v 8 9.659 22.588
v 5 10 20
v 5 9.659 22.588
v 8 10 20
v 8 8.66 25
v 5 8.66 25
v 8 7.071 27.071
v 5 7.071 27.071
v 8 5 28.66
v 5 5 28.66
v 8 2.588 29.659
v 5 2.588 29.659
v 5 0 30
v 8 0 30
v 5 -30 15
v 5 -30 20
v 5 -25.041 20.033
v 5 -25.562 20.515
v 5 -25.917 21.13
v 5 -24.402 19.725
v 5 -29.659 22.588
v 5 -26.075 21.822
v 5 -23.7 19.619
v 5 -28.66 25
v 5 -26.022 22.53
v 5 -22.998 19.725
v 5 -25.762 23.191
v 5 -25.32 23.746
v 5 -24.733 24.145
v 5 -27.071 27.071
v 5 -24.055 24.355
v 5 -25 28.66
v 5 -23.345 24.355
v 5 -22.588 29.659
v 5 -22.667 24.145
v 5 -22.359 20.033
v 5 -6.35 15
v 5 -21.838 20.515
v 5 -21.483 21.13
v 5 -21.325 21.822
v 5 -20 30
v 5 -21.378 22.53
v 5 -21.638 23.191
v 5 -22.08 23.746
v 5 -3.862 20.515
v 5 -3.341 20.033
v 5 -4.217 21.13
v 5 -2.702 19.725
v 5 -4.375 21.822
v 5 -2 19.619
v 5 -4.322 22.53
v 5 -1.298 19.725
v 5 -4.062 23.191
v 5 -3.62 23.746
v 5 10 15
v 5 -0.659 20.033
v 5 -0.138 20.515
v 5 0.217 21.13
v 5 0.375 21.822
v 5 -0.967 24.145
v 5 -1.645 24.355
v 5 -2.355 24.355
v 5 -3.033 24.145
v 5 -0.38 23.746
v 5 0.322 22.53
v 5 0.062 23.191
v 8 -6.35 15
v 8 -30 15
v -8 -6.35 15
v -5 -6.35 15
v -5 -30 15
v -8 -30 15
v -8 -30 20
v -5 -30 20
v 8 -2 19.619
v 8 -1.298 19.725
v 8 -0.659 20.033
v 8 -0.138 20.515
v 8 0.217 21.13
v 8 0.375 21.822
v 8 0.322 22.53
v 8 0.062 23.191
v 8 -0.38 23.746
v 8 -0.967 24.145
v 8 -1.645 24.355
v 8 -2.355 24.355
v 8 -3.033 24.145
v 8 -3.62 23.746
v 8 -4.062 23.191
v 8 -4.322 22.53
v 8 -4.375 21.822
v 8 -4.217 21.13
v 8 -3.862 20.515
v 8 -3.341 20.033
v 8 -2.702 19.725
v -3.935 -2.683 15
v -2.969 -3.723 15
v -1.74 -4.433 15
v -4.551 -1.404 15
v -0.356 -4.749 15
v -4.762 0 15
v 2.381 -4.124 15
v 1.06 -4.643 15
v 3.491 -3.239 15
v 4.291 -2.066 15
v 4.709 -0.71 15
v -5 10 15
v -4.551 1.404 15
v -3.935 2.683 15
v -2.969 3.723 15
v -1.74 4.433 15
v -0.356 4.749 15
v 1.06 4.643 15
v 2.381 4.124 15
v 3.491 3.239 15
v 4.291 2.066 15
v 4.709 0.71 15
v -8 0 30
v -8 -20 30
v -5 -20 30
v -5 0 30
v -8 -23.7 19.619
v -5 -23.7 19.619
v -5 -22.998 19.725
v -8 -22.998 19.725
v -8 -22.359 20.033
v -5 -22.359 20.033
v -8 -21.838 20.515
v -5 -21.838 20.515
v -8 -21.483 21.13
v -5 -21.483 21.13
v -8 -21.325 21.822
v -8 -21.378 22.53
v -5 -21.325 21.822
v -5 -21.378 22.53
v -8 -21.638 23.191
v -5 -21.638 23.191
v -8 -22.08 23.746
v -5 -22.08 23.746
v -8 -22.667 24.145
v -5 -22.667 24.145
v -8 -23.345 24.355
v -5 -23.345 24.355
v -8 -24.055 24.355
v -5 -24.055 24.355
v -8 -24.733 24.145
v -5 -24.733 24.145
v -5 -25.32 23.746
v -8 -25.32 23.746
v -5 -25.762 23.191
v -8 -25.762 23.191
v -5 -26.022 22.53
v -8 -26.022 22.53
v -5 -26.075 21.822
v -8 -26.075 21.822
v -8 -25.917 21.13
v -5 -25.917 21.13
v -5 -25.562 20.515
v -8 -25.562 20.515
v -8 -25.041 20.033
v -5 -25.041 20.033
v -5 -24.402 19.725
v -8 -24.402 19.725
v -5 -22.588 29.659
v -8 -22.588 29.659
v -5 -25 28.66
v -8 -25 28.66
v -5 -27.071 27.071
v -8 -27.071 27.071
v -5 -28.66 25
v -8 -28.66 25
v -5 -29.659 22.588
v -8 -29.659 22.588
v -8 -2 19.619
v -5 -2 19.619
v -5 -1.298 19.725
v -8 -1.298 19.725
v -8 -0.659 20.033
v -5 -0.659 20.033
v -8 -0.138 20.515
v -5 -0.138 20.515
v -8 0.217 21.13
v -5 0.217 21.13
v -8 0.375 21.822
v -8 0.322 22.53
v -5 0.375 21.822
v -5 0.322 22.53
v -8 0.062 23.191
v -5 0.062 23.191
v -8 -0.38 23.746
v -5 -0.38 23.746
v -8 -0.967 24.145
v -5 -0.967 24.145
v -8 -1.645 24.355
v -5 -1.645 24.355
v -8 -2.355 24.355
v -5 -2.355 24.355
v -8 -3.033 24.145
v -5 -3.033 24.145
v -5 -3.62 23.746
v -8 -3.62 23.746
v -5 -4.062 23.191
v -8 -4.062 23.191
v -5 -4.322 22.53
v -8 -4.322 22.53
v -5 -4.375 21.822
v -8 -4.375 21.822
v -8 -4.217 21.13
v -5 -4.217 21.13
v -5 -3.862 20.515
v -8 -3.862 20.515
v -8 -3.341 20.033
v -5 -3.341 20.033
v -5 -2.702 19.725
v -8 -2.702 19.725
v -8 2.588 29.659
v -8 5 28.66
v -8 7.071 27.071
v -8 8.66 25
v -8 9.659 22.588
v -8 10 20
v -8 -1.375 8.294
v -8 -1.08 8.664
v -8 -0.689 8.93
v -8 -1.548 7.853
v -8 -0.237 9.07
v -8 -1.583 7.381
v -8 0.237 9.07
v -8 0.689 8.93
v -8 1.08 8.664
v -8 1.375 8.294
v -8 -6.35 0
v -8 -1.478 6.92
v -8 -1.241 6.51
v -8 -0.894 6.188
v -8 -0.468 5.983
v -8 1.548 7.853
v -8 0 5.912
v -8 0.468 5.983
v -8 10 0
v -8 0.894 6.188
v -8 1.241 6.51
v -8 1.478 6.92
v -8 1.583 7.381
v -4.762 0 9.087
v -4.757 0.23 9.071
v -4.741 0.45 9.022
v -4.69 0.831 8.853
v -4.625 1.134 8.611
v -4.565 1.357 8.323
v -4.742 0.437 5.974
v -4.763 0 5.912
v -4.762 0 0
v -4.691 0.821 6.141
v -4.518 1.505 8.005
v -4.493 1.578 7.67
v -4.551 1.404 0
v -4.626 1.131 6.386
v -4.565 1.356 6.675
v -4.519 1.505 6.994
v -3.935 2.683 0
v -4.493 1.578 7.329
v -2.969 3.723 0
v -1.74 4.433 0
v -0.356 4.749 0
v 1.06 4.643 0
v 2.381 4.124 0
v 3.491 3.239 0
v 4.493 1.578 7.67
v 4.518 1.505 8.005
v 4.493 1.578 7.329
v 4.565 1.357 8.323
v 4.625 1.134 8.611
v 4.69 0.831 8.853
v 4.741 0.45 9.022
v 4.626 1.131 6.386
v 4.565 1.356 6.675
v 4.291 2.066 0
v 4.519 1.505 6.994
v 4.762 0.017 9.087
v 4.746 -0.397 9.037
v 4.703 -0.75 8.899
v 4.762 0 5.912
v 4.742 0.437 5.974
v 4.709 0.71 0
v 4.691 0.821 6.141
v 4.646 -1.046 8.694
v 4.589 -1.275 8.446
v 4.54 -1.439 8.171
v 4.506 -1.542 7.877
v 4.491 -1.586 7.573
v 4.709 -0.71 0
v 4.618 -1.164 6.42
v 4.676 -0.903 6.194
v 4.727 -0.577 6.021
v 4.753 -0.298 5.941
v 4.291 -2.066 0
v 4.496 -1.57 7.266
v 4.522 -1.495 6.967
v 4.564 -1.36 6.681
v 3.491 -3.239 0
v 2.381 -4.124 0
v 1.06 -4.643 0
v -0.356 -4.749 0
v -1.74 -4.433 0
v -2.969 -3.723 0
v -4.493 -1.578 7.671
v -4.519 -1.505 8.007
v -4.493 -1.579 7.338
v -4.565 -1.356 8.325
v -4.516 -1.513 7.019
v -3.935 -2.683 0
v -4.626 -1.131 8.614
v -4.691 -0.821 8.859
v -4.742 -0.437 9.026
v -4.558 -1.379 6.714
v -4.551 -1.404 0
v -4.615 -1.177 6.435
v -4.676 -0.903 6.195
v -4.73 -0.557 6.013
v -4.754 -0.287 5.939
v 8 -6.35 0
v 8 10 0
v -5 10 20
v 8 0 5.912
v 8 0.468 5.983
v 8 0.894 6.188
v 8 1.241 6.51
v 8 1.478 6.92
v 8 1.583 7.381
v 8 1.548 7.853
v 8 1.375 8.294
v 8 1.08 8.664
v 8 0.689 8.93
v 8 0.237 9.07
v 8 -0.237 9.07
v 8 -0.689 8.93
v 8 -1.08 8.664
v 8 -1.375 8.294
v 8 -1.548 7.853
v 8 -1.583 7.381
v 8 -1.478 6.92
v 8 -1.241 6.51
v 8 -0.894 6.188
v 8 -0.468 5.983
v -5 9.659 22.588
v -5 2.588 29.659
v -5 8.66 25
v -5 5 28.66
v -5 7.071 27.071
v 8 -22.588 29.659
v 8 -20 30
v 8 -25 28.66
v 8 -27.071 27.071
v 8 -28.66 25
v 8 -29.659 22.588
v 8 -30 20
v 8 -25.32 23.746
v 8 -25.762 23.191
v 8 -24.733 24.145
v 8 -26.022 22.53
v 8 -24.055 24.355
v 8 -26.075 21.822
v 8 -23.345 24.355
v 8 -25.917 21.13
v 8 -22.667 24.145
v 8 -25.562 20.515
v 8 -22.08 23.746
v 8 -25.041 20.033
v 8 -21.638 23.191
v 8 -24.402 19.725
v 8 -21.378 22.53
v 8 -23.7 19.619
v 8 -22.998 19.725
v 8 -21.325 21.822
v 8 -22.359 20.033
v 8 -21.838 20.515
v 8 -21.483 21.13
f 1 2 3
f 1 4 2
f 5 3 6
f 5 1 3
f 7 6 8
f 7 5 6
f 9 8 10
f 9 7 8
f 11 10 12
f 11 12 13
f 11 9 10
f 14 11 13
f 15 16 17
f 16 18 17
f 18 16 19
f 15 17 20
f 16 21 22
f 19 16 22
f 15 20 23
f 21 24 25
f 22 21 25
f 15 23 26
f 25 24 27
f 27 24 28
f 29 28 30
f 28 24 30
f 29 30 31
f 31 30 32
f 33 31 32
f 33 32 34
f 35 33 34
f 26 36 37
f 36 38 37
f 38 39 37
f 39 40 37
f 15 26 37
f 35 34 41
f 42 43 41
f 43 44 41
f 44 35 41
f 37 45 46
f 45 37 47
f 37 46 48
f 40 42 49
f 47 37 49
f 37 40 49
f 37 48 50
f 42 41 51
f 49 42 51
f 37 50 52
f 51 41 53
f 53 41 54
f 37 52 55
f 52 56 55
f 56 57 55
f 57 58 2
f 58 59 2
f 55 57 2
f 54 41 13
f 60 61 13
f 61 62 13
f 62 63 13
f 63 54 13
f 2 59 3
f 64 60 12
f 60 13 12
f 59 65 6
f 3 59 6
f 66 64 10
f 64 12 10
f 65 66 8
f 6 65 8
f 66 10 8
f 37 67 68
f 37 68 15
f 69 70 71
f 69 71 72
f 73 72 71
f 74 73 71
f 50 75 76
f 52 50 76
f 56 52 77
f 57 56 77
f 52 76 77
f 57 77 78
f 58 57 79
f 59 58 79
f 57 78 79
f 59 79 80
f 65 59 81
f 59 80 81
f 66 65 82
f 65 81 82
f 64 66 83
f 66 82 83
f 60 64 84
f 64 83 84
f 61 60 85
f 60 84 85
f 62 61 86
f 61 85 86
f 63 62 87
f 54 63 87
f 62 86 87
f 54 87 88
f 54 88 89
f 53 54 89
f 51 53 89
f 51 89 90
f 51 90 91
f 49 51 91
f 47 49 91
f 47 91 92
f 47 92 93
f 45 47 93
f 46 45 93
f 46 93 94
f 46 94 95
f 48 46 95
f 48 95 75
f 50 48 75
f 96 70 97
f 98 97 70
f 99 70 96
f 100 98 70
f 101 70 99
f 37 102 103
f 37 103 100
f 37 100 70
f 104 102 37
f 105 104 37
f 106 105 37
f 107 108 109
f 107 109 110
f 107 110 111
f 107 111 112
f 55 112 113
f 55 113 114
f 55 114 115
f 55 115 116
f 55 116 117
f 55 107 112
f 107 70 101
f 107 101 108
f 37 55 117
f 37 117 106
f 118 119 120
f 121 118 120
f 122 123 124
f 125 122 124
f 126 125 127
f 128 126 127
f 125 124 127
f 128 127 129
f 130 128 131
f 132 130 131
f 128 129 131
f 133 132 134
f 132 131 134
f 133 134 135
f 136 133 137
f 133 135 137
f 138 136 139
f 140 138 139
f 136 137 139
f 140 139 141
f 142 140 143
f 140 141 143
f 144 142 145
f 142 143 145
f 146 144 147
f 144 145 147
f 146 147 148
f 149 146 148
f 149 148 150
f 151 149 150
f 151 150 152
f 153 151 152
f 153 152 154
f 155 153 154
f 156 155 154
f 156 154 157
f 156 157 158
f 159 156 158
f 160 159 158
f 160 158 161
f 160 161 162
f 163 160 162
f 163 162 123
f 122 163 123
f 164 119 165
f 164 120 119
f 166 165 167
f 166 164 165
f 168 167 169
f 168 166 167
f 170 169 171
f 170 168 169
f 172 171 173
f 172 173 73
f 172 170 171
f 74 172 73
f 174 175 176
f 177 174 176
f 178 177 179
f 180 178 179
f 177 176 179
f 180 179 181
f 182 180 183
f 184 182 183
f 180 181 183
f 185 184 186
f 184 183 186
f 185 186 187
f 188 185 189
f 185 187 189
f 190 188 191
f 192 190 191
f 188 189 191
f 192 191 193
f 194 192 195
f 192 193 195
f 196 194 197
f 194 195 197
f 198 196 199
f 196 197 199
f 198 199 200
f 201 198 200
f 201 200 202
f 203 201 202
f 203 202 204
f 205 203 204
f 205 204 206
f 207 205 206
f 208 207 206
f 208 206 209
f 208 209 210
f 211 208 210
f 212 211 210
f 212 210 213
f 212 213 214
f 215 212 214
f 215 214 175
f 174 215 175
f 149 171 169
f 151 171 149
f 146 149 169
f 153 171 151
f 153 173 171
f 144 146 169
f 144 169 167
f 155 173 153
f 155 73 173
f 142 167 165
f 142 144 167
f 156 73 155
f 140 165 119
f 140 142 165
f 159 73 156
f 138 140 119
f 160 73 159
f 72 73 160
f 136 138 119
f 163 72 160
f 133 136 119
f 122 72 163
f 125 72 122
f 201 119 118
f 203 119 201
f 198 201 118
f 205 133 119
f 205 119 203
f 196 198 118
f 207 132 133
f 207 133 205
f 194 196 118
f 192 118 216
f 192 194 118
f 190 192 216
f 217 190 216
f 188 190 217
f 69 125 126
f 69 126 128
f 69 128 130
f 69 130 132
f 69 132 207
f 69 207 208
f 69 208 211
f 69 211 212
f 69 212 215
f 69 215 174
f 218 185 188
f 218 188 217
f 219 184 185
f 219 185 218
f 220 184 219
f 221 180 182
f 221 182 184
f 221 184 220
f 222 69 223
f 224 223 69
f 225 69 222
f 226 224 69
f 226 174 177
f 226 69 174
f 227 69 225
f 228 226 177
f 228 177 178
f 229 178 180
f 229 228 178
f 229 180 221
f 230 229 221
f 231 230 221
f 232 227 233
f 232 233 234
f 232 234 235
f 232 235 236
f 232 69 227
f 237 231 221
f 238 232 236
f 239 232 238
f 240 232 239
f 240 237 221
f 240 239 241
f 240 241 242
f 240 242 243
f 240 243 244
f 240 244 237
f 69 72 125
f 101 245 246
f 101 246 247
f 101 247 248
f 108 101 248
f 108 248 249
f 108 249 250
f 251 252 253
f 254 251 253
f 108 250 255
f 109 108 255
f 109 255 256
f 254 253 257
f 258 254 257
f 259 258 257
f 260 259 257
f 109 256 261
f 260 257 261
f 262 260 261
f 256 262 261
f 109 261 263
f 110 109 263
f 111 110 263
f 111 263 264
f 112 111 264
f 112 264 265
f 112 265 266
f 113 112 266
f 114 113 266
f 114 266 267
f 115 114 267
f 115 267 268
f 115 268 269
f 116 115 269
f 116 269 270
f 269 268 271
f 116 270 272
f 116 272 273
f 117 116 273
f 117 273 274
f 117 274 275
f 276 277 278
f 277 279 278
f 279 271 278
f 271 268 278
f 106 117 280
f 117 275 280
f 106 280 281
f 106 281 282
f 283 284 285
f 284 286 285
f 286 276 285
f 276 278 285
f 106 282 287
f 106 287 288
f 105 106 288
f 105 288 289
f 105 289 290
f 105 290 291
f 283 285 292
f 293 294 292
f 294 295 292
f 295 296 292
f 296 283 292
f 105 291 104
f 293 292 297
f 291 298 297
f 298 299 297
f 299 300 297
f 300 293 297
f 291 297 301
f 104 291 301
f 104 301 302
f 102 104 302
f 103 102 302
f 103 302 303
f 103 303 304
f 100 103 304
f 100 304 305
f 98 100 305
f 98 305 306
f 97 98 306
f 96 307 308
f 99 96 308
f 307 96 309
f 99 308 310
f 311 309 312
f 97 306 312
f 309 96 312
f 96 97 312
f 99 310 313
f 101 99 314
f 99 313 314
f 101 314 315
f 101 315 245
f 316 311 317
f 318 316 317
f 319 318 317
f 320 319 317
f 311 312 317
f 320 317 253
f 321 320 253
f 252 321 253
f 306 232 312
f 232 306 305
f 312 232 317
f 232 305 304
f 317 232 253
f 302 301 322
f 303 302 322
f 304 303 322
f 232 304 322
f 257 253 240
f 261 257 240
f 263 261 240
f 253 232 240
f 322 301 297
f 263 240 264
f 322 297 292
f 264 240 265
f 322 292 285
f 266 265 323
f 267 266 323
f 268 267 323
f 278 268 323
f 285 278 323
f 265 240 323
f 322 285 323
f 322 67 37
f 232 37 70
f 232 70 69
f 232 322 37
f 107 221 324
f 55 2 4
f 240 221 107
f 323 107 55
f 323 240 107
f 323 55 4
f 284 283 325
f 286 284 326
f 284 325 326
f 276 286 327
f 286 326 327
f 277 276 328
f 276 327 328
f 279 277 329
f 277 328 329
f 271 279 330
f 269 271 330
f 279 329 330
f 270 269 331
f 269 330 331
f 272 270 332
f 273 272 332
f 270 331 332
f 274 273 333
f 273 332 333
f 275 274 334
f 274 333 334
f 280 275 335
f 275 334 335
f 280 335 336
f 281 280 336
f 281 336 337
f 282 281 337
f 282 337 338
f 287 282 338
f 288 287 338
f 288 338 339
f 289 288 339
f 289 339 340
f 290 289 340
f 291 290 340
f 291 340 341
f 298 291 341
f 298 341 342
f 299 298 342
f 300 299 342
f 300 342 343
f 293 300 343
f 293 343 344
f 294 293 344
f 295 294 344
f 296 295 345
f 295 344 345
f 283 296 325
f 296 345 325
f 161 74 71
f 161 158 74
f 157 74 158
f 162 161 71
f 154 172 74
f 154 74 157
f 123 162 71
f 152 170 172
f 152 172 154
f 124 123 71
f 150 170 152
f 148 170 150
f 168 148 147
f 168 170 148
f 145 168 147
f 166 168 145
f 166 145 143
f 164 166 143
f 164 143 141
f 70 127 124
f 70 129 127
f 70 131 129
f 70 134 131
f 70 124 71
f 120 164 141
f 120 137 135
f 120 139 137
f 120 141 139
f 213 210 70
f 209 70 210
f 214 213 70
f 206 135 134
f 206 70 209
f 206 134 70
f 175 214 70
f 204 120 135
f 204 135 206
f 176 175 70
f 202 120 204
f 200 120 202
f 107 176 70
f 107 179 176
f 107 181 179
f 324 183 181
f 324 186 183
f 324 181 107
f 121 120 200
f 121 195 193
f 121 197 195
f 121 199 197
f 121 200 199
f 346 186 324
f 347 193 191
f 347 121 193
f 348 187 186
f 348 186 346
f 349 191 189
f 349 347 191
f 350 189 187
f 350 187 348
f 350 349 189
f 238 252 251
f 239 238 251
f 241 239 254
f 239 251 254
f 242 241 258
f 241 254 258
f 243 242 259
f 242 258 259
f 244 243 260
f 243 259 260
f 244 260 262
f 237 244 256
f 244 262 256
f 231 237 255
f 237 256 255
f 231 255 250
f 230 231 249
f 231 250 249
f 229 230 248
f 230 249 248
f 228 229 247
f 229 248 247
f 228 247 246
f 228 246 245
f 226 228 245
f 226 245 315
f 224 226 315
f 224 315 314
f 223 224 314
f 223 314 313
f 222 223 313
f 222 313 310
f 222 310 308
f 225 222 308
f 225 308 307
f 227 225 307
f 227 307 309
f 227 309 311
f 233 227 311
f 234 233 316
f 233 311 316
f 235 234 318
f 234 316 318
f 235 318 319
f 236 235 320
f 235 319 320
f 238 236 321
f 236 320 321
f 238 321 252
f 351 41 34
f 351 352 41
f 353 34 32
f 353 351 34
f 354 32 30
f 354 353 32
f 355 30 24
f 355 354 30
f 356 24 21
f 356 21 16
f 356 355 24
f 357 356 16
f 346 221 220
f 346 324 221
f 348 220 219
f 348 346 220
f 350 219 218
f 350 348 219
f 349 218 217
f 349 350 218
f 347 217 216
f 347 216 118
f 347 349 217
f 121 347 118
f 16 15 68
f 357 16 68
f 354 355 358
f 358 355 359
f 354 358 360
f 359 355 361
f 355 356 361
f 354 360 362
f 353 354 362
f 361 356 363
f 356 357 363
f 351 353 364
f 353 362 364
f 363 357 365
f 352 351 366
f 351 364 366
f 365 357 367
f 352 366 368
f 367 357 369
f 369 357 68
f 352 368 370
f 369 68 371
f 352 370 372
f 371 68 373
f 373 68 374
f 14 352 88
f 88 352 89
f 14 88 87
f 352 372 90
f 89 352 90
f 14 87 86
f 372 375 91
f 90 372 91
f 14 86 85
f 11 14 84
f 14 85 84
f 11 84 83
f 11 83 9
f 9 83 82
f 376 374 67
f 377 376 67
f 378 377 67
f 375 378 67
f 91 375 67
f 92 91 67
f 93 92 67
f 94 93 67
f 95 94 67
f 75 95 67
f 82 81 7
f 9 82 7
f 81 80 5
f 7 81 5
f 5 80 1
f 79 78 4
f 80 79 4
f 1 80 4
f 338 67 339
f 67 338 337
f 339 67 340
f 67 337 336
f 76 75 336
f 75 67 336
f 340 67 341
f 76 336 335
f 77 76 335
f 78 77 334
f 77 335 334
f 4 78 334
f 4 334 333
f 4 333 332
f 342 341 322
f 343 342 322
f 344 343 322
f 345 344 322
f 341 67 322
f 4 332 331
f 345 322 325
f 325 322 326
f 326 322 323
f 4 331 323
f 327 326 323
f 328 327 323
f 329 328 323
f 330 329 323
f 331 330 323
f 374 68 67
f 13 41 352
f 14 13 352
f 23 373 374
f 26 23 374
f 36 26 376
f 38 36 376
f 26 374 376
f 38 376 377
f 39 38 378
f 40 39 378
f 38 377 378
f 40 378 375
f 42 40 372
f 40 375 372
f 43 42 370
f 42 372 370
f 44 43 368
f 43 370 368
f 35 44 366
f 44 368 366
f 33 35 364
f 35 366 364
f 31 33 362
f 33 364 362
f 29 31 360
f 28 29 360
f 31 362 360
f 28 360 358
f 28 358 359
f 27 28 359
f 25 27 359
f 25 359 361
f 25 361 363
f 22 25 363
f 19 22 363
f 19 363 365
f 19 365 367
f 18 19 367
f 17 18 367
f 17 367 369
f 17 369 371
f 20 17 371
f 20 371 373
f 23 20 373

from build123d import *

# Parameters (mm, degrees)
SKETCH1_W                      = 16
SKETCH1_H                      = 40
BOSS_EXTRUDE1_DEPTH            = 30
F_3_8_0_3750_DOWEL_HOLE1_D     = 9.525
F_1_8_0_1250_DOWEL_HOLE1_D     = 3.175
SKETCH7_W                      = 10
SKETCH7_H                      = 40
CUT_EXTRUDE1_DEPTH             = 15
F_3_16_0_1875_DIAMETER_HOLE1_D = 4.7625
SKETCH10_W                     = 16
SKETCH10_H                     = 23.65
CUT_EXTRUDE2_DEPTH             = 15
FILLET1_R                      = 10


with BuildPart() as part:
    # Sketch1 → Boss-Extrude1 (new body)
    with BuildSketch(Plane.XY):
        with Locations((0, -10)):
            Rectangle(SKETCH1_W, SKETCH1_H)
    extrude(amount=BOSS_EXTRUDE1_DEPTH)

    # 3/8 (0.3750) Dowel Hole1 (through all)
    with Locations(Plane.XY.offset(30)):
        with Locations((0, 0)):
            Hole(F_3_8_0_3750_DOWEL_HOLE1_D / 2)

    # 1/8 (0.1250) Dowel Hole1 (through all)
    with Locations(Plane.ZY.offset(8)):
        with Locations((7.5, 0)):
            Hole(F_1_8_0_1250_DOWEL_HOLE1_D / 2)

    # Sketch7 → Cut-Extrude1 (cut)
    with BuildSketch(Plane.XY.offset(30)):
        with Locations((0, -10)):
            Rectangle(SKETCH7_W, SKETCH7_H)
    extrude(amount=-CUT_EXTRUDE1_DEPTH, mode=Mode.SUBTRACT)

    # 3/16 (0.1875) Diameter Hole1 (through all)
    with Locations(Plane.ZY.offset(8)):
        with Locations((22, -2), (22, -23.7)):
            Hole(F_3_16_0_1875_DIAMETER_HOLE1_D / 2)

    # Sketch10 → Cut-Extrude2 (cut)
    with BuildSketch(Plane(origin=(0, 0, 0), x_dir=(-1, 0, 0), z_dir=(0, 0, -1))):
        with Locations((0, -18.175)):
            Rectangle(SKETCH10_W, SKETCH10_H)
    extrude(amount=-CUT_EXTRUDE2_DEPTH, mode=Mode.SUBTRACT)

    # Fillet1
    fillet1_edges = [part.edges().sort_by_distance(p)[0] for p in [
        (6.5, 10, 30),
        (6.5, -30, 30),
        (-6.5, 10, 30),
        (-6.5, -30, 30),
    ]]
    fillet(fillet1_edges, radius=FILLET1_R)


solid = part.part
